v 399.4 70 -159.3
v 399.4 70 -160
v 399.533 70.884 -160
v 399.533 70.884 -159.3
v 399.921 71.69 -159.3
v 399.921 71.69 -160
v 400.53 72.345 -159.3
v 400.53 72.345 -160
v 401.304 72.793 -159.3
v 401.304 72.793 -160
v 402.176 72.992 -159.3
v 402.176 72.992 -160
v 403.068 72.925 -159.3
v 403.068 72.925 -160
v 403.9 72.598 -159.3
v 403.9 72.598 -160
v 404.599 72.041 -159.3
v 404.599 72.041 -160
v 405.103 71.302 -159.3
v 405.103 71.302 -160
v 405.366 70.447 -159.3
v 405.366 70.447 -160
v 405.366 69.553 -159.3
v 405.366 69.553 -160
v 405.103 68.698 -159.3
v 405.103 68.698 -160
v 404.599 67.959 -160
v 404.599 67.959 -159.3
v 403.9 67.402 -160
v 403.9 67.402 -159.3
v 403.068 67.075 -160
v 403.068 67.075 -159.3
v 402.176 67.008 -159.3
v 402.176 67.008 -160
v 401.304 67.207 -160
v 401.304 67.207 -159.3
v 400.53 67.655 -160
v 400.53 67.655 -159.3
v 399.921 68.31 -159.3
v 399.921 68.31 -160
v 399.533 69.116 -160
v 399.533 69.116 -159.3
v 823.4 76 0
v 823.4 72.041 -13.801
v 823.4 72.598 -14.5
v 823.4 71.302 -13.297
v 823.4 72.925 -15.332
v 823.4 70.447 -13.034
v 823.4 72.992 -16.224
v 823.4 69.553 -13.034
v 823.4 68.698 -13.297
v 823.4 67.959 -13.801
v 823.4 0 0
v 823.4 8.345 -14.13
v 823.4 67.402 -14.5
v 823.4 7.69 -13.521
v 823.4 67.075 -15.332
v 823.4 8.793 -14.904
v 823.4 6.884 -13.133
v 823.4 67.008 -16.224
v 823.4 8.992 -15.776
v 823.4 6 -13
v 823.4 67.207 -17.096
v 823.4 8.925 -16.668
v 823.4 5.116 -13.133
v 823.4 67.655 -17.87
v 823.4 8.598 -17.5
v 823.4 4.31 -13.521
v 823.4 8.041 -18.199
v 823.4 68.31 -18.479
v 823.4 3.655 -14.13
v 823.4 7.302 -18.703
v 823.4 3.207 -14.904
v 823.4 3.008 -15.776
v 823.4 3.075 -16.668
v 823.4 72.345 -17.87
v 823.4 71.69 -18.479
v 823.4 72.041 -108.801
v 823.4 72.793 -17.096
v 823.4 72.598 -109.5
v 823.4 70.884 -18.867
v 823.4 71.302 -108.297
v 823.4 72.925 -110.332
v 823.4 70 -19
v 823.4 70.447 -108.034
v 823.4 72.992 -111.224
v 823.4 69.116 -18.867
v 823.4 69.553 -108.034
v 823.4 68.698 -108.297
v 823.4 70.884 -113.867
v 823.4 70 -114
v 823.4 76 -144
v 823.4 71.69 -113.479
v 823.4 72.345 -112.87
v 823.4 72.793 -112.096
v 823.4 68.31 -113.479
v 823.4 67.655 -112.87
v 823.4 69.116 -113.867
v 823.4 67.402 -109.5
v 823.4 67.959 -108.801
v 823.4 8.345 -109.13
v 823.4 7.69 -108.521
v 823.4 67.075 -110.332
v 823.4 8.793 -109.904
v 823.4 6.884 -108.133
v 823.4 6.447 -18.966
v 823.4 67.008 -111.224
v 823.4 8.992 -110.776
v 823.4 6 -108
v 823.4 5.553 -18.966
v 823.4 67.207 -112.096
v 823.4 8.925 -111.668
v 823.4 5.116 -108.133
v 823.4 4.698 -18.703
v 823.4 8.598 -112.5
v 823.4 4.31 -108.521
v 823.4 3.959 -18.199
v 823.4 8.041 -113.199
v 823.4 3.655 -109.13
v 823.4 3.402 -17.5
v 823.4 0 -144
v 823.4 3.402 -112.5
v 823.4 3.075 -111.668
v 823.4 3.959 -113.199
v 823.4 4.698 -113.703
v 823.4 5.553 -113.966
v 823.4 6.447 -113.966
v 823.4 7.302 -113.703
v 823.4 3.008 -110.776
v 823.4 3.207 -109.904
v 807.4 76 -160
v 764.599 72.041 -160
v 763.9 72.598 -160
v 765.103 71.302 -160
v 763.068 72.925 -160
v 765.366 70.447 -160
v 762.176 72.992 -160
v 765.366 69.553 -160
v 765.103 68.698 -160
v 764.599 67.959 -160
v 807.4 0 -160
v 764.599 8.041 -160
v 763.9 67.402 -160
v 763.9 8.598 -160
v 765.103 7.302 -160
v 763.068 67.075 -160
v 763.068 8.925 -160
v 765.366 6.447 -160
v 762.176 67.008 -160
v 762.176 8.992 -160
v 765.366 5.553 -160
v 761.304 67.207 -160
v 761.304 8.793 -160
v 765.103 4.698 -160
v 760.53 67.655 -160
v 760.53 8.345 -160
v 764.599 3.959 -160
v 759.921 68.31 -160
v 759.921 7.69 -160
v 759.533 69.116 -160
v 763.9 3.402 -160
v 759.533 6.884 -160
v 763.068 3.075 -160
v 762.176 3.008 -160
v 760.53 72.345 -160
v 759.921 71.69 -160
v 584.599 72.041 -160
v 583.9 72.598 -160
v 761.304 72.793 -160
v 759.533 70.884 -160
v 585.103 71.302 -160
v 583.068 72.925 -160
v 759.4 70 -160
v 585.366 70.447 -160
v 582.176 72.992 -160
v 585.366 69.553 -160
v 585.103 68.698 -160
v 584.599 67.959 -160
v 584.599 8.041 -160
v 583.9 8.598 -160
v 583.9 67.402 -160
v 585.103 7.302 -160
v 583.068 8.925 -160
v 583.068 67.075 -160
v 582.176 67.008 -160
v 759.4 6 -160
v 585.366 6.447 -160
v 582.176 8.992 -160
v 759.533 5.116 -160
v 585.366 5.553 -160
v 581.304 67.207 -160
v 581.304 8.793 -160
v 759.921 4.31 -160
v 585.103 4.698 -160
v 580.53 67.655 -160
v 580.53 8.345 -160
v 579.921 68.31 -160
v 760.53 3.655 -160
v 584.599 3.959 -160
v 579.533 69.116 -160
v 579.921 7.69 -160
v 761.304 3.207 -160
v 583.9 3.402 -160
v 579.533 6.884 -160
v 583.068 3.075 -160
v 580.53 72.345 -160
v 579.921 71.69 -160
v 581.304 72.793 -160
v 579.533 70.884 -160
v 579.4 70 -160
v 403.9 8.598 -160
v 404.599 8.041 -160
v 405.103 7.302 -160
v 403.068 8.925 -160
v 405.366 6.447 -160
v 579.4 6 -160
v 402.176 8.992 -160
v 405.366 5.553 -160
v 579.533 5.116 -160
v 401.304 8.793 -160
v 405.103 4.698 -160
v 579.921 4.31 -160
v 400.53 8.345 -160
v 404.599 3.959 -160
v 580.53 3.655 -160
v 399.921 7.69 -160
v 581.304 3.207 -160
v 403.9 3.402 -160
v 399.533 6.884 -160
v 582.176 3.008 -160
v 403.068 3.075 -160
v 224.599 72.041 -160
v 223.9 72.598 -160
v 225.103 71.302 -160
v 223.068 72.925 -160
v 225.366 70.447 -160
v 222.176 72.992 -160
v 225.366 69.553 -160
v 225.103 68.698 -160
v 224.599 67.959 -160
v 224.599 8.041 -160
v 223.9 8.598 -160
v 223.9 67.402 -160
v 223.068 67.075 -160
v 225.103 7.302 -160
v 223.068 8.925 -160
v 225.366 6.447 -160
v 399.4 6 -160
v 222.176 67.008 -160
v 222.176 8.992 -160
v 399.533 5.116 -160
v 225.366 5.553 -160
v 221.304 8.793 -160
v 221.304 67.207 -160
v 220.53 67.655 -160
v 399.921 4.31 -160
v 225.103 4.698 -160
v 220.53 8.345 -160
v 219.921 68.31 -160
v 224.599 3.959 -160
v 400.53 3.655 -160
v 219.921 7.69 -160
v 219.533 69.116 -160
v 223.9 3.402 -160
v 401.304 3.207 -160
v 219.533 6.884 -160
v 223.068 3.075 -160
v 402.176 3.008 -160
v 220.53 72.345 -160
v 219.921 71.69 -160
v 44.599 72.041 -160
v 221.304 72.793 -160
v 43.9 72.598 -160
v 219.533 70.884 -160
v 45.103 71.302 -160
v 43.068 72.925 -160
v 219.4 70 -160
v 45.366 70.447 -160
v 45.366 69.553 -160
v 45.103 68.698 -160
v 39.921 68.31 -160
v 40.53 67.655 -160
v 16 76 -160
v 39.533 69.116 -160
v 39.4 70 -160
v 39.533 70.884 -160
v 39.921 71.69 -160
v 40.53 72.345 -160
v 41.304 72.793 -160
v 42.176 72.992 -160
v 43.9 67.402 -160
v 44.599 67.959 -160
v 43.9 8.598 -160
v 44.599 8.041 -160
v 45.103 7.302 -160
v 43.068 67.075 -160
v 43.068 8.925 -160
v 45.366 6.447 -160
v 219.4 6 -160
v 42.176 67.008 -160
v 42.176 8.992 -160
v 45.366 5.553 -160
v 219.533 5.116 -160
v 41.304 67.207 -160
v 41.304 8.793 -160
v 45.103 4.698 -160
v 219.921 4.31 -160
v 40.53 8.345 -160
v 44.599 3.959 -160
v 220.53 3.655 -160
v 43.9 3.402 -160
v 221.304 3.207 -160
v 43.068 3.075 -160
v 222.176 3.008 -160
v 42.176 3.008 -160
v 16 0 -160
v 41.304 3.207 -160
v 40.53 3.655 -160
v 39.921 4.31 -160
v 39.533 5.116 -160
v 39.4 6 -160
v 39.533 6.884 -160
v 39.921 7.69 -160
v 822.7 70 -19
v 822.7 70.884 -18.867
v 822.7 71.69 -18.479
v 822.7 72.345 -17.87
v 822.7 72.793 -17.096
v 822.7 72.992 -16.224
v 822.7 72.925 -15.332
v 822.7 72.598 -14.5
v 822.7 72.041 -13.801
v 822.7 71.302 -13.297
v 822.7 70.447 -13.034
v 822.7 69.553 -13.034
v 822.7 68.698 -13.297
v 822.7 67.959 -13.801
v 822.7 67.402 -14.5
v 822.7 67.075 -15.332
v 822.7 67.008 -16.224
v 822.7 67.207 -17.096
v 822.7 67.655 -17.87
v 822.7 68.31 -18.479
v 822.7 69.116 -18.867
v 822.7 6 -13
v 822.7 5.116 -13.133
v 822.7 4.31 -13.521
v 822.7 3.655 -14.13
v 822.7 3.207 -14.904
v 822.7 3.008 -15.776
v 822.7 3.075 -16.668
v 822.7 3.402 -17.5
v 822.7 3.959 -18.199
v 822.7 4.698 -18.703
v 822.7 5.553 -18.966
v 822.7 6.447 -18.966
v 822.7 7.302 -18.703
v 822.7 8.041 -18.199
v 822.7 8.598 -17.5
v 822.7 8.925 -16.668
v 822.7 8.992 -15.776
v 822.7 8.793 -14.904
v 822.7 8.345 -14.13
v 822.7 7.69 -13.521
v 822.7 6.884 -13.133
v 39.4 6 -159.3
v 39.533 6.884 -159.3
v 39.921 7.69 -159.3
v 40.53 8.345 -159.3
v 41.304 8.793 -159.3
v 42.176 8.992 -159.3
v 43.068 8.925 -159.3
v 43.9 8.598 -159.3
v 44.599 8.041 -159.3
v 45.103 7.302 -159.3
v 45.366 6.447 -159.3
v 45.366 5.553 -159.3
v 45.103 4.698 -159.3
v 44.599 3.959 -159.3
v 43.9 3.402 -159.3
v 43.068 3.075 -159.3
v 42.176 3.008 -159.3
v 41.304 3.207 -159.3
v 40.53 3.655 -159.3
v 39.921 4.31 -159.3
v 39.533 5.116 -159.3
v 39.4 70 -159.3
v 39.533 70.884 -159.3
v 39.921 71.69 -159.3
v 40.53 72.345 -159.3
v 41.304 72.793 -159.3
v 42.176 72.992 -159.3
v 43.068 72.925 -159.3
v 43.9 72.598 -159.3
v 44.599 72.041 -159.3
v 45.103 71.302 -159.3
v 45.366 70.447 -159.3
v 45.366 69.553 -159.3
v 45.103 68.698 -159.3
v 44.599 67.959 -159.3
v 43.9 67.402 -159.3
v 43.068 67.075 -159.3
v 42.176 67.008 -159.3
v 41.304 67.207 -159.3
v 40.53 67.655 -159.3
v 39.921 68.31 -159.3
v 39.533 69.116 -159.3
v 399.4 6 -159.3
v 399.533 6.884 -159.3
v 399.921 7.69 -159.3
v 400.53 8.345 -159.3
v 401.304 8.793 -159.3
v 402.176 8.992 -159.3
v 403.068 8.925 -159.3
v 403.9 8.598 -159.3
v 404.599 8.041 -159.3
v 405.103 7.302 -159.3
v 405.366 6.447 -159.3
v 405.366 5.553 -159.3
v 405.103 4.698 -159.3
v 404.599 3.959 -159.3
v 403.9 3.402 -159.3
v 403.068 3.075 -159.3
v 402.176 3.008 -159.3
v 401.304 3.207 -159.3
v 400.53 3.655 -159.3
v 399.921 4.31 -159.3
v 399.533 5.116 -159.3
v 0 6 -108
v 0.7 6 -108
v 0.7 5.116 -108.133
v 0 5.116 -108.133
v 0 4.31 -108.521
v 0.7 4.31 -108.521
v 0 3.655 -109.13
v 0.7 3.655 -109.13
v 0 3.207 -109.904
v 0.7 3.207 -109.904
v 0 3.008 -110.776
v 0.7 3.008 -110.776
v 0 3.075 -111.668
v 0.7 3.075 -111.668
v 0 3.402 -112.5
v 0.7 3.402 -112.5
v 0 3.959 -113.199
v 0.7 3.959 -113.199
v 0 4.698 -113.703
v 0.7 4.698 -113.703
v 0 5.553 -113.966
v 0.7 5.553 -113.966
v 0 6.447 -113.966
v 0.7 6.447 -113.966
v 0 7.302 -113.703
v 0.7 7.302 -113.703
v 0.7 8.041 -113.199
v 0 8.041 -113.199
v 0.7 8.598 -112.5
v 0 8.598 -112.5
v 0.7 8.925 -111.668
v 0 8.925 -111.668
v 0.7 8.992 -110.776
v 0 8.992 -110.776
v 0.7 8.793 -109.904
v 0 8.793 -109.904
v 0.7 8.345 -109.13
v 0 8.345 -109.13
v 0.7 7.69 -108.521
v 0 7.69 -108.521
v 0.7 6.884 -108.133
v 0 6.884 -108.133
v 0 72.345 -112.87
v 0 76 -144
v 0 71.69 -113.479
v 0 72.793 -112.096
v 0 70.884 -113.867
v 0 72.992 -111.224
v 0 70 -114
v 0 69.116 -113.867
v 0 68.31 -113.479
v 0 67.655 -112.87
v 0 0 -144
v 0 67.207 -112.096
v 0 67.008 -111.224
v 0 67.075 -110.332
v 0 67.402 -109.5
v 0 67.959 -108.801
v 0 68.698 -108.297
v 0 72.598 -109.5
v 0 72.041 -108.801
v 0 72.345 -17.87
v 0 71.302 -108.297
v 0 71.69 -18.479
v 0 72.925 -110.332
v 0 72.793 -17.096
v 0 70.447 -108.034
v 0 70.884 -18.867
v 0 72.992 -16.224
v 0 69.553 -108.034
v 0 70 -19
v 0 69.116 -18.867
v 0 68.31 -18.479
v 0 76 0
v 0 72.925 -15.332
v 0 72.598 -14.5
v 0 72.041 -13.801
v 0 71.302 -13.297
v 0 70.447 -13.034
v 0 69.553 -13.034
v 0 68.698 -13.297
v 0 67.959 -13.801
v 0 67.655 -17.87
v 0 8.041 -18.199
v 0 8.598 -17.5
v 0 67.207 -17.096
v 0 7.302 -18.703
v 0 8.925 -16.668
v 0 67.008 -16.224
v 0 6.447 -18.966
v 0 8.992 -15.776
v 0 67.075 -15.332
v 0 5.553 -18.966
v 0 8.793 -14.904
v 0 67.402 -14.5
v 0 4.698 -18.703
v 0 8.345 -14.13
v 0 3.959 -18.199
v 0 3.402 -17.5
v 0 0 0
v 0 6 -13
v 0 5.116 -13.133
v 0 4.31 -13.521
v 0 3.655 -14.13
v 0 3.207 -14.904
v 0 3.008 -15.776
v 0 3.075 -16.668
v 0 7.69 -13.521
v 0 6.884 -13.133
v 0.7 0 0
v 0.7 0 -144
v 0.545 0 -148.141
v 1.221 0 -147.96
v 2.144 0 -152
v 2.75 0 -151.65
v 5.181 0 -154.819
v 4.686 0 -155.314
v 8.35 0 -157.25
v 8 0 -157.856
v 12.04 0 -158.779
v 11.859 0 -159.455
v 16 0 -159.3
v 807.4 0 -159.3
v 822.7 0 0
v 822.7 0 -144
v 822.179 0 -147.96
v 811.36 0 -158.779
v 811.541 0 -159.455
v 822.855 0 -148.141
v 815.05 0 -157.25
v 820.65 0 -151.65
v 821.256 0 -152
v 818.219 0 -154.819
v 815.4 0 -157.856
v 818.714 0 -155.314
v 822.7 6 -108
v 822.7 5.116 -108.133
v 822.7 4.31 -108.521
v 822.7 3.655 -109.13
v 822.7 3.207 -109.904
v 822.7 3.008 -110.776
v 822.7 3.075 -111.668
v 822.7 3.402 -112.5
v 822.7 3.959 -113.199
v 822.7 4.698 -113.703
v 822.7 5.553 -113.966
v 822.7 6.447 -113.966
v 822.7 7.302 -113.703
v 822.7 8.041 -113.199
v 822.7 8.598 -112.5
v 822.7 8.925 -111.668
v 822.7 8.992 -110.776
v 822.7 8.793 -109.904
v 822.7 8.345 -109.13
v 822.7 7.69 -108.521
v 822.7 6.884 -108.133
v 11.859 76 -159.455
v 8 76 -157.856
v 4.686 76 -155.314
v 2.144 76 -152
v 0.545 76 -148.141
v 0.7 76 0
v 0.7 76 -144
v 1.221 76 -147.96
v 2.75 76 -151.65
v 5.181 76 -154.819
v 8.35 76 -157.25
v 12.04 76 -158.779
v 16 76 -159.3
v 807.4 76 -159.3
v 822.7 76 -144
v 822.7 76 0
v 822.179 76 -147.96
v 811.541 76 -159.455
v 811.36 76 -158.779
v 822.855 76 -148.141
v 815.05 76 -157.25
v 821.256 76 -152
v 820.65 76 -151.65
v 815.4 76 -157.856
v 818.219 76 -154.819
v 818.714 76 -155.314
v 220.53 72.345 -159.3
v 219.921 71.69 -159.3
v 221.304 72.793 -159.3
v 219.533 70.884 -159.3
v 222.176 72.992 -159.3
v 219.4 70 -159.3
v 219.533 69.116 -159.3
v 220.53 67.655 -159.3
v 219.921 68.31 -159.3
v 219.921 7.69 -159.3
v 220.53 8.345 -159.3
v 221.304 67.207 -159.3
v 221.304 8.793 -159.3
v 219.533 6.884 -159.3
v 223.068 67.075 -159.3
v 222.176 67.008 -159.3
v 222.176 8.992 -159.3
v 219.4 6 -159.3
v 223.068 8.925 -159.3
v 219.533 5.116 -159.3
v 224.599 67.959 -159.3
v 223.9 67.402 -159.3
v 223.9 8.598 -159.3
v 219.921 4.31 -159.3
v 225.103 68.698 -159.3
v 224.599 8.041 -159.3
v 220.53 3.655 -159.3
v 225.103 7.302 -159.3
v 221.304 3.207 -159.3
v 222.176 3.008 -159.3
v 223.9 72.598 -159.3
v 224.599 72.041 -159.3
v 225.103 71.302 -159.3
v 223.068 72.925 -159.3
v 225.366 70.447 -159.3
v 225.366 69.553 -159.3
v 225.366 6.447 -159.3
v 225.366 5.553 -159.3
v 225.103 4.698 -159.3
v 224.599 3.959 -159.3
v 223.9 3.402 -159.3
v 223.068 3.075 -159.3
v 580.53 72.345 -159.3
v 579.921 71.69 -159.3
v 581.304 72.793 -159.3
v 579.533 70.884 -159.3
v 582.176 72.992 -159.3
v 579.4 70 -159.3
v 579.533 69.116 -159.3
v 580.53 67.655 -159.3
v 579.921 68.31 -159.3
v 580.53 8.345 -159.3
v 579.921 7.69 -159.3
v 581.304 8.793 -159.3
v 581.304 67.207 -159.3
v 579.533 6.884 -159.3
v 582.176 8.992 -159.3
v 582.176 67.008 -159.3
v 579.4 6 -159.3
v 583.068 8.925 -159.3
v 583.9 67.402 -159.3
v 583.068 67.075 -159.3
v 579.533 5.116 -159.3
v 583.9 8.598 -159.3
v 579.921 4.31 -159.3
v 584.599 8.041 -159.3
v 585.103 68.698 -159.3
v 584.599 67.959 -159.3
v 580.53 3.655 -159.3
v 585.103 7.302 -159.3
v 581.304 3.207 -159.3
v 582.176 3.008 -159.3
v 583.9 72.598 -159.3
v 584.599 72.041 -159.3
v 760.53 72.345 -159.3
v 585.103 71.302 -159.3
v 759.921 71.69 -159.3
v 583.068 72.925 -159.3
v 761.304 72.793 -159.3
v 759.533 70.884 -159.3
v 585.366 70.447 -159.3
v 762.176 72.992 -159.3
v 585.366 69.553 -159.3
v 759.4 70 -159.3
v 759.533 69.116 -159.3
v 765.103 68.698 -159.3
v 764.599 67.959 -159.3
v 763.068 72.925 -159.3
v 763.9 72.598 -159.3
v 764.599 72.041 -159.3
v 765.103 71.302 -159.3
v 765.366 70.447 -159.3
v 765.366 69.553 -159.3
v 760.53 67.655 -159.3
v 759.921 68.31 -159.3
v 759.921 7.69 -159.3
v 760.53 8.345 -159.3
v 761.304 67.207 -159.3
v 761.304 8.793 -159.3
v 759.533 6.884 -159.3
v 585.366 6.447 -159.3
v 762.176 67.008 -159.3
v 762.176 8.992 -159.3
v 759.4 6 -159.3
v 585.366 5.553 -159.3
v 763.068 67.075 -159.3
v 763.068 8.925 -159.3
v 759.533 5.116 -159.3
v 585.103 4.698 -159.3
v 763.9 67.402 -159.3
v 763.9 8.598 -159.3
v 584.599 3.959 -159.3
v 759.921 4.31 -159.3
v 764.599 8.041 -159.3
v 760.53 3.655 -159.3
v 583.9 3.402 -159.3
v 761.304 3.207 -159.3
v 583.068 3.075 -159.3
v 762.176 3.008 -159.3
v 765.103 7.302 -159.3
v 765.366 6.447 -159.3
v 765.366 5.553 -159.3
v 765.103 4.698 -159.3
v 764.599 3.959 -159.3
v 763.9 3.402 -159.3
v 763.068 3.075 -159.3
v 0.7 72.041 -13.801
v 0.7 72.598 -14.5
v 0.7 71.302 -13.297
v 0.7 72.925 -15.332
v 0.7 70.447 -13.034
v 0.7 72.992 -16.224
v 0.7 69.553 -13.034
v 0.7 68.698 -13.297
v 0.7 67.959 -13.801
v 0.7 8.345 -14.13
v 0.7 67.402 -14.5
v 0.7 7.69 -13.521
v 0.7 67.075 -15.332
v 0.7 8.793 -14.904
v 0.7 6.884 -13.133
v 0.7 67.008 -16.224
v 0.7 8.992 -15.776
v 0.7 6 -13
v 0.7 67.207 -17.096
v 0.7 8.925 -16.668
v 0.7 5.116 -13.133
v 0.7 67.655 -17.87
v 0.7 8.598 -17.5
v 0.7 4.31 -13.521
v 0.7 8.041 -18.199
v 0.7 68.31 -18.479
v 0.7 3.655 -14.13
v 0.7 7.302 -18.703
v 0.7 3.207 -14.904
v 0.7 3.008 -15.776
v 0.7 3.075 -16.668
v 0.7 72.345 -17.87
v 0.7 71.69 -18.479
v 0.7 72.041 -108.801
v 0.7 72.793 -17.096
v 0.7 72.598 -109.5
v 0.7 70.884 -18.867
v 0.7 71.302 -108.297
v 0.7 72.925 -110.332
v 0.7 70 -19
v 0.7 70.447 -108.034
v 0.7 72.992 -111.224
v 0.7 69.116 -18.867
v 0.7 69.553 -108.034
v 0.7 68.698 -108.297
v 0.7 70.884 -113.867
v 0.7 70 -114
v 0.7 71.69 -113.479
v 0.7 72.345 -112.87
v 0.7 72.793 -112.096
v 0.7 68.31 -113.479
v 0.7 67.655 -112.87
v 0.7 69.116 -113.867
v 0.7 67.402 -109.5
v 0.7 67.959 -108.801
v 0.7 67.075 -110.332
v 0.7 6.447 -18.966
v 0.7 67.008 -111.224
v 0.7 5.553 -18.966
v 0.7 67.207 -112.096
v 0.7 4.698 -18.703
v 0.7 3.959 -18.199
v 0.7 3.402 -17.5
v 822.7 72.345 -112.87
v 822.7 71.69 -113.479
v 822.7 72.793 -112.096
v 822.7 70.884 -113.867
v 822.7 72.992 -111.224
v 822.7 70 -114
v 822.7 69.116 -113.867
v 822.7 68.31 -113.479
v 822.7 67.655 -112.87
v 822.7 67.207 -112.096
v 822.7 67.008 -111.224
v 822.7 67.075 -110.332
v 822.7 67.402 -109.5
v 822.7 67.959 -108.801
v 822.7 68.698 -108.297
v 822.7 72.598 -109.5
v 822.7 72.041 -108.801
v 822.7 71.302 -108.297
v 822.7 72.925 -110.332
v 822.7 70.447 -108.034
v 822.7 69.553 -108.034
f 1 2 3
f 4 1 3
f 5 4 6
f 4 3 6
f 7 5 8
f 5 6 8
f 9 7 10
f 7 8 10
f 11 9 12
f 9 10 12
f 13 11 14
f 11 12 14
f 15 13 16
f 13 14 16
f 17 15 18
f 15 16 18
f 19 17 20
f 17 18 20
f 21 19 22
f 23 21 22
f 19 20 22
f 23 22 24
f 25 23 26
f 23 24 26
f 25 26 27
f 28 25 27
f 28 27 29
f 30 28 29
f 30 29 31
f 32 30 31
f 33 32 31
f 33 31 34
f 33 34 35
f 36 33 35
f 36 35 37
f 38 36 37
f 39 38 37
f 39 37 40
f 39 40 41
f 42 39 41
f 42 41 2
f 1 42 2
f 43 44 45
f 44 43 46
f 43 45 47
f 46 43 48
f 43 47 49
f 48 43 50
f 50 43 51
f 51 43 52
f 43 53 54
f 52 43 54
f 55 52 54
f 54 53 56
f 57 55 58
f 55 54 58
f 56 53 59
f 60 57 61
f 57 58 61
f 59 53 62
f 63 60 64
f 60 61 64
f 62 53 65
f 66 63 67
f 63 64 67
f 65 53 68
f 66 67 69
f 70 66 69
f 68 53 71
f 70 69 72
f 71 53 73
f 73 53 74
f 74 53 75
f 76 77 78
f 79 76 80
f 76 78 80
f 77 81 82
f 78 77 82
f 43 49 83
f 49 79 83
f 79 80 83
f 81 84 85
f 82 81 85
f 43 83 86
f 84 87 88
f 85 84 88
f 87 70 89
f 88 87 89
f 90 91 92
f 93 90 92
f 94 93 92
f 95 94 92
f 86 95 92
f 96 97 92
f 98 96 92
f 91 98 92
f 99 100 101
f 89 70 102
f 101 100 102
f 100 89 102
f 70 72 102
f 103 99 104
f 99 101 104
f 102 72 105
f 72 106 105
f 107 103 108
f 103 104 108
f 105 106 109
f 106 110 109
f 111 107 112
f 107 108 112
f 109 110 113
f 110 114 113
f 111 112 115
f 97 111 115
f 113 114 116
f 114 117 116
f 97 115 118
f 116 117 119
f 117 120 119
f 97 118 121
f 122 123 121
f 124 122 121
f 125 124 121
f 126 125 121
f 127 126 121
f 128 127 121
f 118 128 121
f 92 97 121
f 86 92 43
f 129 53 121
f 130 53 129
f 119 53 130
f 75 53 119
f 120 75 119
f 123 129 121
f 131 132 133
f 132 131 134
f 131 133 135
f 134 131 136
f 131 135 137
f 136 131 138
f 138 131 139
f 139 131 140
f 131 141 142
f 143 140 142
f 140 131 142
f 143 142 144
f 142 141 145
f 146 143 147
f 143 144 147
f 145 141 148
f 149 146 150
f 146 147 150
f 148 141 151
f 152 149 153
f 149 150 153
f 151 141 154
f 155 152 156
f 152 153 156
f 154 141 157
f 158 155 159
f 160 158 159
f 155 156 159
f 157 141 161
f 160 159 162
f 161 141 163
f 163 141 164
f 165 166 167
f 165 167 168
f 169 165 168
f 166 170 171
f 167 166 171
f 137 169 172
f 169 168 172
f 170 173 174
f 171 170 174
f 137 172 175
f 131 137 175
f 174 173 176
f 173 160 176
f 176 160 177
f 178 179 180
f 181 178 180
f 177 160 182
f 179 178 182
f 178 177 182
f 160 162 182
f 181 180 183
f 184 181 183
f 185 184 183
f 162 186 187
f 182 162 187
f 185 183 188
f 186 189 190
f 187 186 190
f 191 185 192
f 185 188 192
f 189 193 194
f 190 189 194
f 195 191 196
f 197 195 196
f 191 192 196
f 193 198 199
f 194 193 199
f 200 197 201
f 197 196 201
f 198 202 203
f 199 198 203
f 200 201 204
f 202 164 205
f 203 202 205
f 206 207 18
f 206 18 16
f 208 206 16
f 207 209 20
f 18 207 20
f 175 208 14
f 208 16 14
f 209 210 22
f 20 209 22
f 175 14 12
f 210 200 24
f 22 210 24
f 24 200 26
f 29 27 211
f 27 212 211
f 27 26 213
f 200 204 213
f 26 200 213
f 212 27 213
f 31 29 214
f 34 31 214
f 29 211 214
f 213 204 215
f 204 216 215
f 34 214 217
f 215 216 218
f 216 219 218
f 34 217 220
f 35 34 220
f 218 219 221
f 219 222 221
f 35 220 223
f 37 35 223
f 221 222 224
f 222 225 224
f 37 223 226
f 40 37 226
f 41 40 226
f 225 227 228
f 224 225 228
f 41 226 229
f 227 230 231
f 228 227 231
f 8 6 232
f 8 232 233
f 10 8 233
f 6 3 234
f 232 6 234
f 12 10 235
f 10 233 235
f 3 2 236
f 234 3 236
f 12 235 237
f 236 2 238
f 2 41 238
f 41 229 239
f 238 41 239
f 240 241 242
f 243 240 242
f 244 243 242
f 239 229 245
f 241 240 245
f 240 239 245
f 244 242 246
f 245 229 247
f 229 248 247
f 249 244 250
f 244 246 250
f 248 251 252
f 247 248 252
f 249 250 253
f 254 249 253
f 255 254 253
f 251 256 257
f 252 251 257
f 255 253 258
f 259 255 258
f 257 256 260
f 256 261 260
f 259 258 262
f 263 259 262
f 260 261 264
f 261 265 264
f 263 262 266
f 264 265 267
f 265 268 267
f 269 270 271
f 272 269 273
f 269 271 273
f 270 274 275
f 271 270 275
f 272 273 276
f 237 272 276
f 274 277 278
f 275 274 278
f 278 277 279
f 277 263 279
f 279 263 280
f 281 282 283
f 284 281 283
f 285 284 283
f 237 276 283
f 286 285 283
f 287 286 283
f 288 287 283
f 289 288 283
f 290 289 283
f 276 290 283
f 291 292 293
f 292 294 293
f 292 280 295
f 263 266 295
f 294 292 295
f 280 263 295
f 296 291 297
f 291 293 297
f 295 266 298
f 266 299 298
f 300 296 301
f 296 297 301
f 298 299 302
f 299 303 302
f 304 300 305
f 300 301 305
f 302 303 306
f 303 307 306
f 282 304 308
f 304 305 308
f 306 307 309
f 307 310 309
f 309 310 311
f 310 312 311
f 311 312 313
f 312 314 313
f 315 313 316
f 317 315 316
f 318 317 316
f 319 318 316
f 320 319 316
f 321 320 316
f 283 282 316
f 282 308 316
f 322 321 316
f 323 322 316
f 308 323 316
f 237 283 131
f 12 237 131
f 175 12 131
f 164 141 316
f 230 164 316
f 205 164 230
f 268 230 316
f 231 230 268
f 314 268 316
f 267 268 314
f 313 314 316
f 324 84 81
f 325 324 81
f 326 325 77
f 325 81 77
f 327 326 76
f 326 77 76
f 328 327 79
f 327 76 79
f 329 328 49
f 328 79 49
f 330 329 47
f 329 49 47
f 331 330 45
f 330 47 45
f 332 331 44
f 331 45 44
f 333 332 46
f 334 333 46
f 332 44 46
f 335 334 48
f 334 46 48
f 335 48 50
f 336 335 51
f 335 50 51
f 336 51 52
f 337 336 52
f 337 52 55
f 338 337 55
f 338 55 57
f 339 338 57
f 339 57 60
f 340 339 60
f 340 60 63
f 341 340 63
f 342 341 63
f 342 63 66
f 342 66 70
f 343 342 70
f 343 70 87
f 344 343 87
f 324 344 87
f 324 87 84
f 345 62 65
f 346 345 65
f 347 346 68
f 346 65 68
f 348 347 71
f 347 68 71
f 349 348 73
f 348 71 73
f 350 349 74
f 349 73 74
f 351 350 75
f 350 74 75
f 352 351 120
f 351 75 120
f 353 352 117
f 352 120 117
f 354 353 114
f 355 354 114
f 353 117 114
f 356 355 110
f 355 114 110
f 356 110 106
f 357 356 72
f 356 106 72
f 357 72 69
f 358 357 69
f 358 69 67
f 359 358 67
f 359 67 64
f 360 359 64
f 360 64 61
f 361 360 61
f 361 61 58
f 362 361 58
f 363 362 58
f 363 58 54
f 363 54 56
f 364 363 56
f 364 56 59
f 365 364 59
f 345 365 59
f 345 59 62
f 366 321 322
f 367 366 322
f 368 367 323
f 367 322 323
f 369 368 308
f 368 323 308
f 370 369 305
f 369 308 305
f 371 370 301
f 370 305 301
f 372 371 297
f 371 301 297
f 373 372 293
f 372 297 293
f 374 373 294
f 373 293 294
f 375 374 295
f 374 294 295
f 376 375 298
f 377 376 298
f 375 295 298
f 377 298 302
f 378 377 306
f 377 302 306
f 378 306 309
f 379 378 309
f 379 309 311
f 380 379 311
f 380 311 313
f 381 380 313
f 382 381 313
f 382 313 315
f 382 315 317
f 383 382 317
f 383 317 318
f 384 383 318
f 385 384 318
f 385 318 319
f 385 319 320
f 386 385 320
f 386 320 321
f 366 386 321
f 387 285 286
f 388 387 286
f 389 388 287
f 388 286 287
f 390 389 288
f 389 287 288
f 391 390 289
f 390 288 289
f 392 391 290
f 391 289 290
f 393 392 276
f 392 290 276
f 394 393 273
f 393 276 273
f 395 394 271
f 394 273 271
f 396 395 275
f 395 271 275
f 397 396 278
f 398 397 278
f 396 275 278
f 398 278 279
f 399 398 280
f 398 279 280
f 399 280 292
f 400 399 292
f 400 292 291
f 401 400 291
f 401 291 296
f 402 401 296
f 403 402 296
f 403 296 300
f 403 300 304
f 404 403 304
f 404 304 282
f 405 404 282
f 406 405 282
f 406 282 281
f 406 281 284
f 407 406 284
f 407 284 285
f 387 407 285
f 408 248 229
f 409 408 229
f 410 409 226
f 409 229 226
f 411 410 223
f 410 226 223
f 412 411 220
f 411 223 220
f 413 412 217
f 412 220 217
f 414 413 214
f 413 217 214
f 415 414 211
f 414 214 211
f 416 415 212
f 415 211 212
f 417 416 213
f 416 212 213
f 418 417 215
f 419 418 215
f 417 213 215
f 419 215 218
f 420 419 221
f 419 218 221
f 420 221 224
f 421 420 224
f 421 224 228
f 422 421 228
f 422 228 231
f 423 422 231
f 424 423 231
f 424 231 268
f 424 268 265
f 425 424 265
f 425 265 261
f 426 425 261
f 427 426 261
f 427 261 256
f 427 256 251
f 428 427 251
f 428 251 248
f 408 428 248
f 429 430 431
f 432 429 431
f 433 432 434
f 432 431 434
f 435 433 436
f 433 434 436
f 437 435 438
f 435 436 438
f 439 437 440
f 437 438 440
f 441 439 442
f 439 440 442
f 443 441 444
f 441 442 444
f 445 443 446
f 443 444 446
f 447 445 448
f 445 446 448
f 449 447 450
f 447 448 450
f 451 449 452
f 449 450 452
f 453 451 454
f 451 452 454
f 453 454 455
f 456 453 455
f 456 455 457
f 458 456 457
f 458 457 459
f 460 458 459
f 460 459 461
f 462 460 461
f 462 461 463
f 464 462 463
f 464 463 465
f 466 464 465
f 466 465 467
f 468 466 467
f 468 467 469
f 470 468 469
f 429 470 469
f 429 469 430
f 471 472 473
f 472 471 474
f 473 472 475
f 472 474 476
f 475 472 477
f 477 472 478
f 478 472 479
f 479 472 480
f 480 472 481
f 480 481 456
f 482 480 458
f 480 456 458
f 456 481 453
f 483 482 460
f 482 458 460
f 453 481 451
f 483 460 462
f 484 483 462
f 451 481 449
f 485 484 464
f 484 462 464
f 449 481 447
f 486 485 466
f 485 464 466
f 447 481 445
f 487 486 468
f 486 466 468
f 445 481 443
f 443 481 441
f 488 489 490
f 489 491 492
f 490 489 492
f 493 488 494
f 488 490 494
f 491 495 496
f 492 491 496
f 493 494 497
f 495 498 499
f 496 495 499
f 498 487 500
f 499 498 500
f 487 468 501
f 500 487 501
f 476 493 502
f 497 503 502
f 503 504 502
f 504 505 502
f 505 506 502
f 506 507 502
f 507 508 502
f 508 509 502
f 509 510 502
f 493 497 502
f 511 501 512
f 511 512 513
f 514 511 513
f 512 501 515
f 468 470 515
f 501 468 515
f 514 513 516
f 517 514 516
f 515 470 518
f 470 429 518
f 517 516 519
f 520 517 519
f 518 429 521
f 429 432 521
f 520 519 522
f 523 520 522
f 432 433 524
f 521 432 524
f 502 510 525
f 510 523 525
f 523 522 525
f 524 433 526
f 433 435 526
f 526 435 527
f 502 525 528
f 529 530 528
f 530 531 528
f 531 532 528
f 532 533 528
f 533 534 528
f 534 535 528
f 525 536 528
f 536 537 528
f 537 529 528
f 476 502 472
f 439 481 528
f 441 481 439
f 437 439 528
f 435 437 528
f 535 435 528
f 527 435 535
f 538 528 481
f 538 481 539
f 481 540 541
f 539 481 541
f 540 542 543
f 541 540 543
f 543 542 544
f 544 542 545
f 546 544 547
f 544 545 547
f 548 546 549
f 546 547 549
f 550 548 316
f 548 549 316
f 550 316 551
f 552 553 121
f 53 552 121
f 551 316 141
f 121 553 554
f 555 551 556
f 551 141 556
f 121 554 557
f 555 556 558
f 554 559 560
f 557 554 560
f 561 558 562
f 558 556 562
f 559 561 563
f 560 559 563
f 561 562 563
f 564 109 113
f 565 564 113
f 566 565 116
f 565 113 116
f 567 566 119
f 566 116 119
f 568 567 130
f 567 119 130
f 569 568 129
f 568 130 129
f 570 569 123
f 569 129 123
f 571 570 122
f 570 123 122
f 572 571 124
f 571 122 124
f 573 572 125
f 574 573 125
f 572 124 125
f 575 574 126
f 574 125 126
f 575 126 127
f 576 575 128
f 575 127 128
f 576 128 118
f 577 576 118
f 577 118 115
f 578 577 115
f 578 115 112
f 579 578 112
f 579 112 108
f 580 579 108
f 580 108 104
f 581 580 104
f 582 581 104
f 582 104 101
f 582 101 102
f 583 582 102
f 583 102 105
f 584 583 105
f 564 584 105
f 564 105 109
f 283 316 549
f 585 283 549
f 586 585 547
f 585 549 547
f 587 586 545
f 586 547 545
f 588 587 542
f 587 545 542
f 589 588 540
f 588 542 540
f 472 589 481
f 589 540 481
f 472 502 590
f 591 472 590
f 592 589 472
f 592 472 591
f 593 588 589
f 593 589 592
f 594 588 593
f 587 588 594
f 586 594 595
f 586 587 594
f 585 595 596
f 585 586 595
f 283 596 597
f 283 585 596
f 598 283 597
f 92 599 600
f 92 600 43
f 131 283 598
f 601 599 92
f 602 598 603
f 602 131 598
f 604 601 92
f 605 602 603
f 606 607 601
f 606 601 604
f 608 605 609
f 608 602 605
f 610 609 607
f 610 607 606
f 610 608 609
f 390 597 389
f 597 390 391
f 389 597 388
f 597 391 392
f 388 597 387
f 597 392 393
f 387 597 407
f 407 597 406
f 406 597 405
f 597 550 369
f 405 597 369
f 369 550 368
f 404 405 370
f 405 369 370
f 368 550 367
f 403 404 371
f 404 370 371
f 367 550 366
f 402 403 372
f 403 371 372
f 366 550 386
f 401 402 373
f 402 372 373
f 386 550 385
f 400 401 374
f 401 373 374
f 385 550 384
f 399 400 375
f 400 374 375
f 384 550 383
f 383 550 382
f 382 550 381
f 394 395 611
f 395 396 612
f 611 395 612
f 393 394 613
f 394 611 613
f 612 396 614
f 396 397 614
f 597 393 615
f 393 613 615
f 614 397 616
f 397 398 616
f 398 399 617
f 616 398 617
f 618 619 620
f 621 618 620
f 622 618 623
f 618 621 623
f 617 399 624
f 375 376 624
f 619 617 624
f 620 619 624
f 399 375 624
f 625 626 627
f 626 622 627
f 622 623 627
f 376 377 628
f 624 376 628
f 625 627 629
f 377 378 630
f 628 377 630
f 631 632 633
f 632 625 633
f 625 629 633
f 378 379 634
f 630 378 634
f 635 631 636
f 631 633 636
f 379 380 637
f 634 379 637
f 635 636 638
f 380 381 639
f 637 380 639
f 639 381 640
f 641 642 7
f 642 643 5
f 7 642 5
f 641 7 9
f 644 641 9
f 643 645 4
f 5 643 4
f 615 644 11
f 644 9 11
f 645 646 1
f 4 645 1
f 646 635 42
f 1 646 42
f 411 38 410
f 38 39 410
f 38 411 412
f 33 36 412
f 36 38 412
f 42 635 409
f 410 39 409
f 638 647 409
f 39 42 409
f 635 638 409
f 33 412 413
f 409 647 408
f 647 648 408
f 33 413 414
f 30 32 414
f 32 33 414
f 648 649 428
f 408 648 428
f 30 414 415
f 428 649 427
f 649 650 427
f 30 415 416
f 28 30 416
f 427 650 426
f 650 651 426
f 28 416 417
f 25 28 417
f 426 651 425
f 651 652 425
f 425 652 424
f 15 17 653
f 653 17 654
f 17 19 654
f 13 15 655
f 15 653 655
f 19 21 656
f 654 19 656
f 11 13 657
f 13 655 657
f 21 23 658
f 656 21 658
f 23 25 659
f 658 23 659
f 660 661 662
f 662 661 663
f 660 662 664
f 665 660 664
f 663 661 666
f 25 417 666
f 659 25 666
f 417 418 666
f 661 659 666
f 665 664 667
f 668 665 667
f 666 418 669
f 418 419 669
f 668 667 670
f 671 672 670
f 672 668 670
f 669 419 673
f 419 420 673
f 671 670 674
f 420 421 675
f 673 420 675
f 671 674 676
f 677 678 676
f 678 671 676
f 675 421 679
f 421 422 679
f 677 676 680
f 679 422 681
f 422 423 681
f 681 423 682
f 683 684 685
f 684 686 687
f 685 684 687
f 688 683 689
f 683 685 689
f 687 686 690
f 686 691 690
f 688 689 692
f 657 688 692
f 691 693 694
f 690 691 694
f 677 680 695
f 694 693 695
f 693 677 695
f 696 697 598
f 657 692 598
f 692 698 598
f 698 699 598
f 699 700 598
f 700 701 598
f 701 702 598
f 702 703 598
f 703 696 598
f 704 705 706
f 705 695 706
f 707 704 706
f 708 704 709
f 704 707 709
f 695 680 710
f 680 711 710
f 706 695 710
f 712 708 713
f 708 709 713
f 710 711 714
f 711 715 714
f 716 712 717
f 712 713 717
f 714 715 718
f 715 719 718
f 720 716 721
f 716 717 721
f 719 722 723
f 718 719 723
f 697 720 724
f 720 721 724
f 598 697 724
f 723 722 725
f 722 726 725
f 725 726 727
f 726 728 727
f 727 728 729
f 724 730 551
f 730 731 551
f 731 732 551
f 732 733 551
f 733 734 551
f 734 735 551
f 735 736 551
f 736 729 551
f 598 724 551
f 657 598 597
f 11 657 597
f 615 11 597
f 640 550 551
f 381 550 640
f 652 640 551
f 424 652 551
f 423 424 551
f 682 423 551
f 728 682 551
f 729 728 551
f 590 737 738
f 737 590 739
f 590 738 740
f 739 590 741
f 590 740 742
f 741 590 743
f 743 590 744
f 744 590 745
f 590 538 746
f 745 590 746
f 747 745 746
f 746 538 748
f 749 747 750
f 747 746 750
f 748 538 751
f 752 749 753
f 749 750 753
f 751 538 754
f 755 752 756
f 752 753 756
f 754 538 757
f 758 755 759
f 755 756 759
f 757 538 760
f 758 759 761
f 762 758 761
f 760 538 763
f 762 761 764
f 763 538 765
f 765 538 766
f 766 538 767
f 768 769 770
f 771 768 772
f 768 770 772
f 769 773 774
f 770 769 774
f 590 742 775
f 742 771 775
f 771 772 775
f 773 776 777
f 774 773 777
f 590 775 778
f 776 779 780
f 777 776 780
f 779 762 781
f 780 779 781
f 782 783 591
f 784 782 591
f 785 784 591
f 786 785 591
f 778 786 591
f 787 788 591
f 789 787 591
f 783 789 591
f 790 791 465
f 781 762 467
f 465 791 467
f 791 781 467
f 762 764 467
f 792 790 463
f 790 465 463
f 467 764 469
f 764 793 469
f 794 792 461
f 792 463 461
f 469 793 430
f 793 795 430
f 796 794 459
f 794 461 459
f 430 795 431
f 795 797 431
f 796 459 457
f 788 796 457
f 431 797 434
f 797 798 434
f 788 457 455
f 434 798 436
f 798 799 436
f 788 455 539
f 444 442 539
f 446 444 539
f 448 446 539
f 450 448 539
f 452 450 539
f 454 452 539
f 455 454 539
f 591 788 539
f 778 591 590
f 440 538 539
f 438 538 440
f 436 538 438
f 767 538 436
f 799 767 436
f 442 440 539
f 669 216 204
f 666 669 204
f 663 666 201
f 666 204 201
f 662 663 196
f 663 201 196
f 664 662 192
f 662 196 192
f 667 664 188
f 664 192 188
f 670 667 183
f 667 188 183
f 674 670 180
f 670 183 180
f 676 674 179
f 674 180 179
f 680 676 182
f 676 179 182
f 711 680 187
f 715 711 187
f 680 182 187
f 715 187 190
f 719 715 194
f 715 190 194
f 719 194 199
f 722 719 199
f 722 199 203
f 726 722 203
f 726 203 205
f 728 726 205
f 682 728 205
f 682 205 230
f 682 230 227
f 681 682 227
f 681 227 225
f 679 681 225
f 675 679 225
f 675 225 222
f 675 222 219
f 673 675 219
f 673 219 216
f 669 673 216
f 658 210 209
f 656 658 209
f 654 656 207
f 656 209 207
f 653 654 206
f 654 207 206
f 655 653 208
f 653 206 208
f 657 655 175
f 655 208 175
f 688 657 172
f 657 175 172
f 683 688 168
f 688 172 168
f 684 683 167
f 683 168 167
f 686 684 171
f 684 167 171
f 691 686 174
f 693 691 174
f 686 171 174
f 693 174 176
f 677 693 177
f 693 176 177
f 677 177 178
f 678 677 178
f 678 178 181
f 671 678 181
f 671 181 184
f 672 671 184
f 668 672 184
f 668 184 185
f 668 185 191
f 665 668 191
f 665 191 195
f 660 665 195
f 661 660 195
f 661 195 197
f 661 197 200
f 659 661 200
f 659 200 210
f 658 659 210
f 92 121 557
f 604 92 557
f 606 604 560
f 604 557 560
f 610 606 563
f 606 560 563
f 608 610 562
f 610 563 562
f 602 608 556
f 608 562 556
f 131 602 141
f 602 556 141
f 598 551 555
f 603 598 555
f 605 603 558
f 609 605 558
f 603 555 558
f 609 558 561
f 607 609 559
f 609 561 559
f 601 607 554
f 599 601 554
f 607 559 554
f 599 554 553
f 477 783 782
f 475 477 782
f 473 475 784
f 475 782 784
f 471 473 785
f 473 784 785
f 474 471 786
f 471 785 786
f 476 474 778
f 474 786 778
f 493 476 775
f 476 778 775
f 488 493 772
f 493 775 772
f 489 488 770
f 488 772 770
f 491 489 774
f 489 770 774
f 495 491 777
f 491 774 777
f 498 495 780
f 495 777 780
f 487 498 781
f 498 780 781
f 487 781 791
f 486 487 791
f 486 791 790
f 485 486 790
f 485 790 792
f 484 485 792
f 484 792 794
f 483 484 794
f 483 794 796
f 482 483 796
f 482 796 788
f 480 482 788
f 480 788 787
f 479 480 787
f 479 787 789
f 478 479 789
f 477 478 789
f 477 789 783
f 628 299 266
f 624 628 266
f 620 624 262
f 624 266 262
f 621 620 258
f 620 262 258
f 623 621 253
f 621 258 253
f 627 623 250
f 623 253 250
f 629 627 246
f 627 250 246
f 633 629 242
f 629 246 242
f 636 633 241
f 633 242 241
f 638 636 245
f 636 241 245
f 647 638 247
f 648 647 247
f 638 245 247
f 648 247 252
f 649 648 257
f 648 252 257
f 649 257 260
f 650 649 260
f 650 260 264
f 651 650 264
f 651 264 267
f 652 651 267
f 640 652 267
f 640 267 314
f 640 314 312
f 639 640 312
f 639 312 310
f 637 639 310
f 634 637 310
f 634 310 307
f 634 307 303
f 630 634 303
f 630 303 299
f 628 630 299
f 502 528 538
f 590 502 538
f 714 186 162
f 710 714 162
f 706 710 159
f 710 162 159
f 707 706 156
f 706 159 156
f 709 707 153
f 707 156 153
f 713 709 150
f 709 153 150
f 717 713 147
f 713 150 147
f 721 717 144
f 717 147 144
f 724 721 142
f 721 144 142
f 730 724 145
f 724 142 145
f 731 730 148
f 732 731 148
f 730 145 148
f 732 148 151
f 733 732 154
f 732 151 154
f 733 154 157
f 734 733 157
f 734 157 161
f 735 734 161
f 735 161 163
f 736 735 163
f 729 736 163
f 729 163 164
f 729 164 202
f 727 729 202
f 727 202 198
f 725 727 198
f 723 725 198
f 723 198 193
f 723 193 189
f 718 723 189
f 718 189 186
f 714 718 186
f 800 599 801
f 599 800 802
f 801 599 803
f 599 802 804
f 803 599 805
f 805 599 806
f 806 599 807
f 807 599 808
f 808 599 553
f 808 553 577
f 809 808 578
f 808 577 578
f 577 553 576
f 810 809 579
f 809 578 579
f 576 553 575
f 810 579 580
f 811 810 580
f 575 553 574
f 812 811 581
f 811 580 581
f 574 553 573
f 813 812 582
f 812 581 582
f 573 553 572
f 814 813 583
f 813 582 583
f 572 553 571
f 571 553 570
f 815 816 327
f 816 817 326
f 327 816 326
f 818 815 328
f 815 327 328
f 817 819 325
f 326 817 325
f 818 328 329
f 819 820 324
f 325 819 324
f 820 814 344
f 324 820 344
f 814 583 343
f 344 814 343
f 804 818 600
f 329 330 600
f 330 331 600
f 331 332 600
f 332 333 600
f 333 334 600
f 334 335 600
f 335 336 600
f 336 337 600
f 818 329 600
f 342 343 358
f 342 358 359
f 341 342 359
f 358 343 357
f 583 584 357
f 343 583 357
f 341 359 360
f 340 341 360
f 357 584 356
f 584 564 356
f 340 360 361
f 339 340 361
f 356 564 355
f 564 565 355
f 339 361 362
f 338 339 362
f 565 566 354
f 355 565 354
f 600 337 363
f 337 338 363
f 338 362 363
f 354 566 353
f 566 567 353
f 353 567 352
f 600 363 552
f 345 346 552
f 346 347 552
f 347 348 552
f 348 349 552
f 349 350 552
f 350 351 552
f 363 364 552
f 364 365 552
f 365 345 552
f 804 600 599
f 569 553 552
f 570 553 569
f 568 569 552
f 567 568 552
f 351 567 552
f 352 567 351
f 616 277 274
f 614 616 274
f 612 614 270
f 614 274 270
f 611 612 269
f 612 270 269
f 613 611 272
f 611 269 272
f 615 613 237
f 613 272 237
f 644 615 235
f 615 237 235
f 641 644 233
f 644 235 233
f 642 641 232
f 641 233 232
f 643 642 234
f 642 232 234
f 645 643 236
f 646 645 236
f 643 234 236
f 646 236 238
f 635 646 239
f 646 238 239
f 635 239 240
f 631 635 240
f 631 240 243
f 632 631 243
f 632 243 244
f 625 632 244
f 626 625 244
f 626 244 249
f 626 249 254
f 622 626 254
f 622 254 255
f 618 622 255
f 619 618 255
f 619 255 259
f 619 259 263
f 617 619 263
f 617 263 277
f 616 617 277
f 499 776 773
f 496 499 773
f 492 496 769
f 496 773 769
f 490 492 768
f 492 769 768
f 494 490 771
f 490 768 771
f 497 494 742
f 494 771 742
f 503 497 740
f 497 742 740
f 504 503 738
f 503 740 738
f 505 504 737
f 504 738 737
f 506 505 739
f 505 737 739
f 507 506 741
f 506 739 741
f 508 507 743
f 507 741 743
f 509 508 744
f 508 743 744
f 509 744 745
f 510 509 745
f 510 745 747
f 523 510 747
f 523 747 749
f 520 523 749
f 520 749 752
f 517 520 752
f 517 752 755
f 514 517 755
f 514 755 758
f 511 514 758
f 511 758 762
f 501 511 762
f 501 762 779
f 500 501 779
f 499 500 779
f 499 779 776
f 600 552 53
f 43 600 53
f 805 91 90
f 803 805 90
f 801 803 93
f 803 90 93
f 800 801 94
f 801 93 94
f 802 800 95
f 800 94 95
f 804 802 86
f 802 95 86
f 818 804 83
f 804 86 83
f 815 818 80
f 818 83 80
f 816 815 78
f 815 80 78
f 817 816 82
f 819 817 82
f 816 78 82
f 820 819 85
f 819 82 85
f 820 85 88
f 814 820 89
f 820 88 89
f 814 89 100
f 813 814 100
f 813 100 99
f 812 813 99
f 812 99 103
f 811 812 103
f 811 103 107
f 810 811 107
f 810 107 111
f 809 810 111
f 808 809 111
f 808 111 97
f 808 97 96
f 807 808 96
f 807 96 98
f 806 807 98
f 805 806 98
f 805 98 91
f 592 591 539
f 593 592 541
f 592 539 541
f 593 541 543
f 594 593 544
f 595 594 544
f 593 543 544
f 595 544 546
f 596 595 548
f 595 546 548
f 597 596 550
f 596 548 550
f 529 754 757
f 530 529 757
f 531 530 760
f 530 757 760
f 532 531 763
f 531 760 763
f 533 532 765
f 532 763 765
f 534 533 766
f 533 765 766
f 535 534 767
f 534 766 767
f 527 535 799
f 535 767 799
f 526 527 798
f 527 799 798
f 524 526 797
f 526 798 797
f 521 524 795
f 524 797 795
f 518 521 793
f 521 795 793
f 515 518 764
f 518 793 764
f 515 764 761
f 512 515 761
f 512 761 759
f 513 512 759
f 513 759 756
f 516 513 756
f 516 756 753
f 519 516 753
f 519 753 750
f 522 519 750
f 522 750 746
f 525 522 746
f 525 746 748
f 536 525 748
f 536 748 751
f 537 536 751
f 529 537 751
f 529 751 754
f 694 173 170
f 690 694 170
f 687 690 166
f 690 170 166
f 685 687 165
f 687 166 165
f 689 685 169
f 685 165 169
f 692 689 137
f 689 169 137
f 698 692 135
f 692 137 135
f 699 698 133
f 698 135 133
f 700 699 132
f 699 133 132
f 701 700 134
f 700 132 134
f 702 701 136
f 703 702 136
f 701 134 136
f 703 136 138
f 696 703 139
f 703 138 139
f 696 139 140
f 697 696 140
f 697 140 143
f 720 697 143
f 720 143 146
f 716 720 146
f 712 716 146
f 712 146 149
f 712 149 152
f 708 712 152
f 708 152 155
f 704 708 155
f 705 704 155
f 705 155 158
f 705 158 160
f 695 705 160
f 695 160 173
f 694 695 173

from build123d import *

# Parameters (mm, degrees)
BASE_FLANGE1_DEPTH = 76
SKETCH2_R          = 3
CUT_EXTRUDE1_DEPTH = 843.237234988
SKETCH3_R          = 3
CUT_EXTRUDE2_DEPTH = 10


# Read off the part's stored shape, not the designer's step: Base-Flange1
with BuildPart() as part:
    # Base-Flange1 outline → Base-Flange1 (new body)
    with BuildSketch(Plane(origin=(0, 0, 0), x_dir=(1, 0, 0), z_dir=(0, 1, 0))):
        with BuildLine():
            Line((822.7, 144), (822.7, 0))
            Line((822.7, 0), (823.4, 0))
            Line((823.4, 0), (823.4, 144))
            ThreePointArc((823.4, 144), (818.713708499, 155.313708499), (807.4, 160))
            Line((807.4, 160), (16, 160))
            ThreePointArc((16, 160), (4.686291501, 155.313708499), (0, 144))
            Line((0, 144), (0, 0))
            Line((0, 0), (0.7, 0))
            Line((0.7, 0), (0.7, 144))
            ThreePointArc((0.7, 144), (5.181266248, 154.818733752), (16, 159.3))
            Line((16, 159.3), (807.4, 159.3))
            ThreePointArc((807.4, 159.3), (818.218733752, 154.818733752), (822.7, 144))
        make_face()
    extrude(amount=BASE_FLANGE1_DEPTH)

    # Sketch2 → Cut-Extrude1 (cut, through all)
    with BuildSketch(Plane(origin=(823.4, 0, 0), x_dir=(0, 0, -1), z_dir=(1, 0, 0))):
        with Locations((16, 70)):
            Circle(SKETCH2_R)
        with Locations((111, 70)):
            Circle(SKETCH2_R)
        with Locations(Location((111, 6, 0), (0, 0, 180))):
            Circle(SKETCH2_R)
        with Locations(Location((16, 6, 0), (0, 0, 180))):
            Circle(SKETCH2_R)
    extrude(amount=-CUT_EXTRUDE1_DEPTH, mode=Mode.SUBTRACT)

    # Sketch3 → Cut-Extrude2 (cut)
    with BuildSketch(Plane(origin=(0, 0, -160), x_dir=(-1, 0, 0), z_dir=(0, 0, -1))):
        with Locations((-762.4, 70)):
            Circle(SKETCH3_R)
        with Locations((-582.4, 70)):
            Circle(SKETCH3_R)
        with Locations((-402.4, 70)):
            Circle(SKETCH3_R)
        with Locations((-222.4, 70)):
            Circle(SKETCH3_R)
        with Locations((-42.4, 70)):
            Circle(SKETCH3_R)
        with Locations((137.6, 70)):
            Circle(SKETCH3_R)
        with Locations((317.6, 70)):
            Circle(SKETCH3_R)
        with Locations((317.6, 6)):
            Circle(SKETCH3_R)
        with Locations((137.6, 6)):
            Circle(SKETCH3_R)
        with Locations((-42.4, 6)):
            Circle(SKETCH3_R)
        with Locations((-222.4, 6)):
            Circle(SKETCH3_R)
        with Locations((-402.4, 6)):
            Circle(SKETCH3_R)
        with Locations((-582.4, 6)):
            Circle(SKETCH3_R)
        with Locations((-762.4, 6)):
            Circle(SKETCH3_R)
    extrude(amount=-CUT_EXTRUDE2_DEPTH, mode=Mode.SUBTRACT)


solid = part.part
